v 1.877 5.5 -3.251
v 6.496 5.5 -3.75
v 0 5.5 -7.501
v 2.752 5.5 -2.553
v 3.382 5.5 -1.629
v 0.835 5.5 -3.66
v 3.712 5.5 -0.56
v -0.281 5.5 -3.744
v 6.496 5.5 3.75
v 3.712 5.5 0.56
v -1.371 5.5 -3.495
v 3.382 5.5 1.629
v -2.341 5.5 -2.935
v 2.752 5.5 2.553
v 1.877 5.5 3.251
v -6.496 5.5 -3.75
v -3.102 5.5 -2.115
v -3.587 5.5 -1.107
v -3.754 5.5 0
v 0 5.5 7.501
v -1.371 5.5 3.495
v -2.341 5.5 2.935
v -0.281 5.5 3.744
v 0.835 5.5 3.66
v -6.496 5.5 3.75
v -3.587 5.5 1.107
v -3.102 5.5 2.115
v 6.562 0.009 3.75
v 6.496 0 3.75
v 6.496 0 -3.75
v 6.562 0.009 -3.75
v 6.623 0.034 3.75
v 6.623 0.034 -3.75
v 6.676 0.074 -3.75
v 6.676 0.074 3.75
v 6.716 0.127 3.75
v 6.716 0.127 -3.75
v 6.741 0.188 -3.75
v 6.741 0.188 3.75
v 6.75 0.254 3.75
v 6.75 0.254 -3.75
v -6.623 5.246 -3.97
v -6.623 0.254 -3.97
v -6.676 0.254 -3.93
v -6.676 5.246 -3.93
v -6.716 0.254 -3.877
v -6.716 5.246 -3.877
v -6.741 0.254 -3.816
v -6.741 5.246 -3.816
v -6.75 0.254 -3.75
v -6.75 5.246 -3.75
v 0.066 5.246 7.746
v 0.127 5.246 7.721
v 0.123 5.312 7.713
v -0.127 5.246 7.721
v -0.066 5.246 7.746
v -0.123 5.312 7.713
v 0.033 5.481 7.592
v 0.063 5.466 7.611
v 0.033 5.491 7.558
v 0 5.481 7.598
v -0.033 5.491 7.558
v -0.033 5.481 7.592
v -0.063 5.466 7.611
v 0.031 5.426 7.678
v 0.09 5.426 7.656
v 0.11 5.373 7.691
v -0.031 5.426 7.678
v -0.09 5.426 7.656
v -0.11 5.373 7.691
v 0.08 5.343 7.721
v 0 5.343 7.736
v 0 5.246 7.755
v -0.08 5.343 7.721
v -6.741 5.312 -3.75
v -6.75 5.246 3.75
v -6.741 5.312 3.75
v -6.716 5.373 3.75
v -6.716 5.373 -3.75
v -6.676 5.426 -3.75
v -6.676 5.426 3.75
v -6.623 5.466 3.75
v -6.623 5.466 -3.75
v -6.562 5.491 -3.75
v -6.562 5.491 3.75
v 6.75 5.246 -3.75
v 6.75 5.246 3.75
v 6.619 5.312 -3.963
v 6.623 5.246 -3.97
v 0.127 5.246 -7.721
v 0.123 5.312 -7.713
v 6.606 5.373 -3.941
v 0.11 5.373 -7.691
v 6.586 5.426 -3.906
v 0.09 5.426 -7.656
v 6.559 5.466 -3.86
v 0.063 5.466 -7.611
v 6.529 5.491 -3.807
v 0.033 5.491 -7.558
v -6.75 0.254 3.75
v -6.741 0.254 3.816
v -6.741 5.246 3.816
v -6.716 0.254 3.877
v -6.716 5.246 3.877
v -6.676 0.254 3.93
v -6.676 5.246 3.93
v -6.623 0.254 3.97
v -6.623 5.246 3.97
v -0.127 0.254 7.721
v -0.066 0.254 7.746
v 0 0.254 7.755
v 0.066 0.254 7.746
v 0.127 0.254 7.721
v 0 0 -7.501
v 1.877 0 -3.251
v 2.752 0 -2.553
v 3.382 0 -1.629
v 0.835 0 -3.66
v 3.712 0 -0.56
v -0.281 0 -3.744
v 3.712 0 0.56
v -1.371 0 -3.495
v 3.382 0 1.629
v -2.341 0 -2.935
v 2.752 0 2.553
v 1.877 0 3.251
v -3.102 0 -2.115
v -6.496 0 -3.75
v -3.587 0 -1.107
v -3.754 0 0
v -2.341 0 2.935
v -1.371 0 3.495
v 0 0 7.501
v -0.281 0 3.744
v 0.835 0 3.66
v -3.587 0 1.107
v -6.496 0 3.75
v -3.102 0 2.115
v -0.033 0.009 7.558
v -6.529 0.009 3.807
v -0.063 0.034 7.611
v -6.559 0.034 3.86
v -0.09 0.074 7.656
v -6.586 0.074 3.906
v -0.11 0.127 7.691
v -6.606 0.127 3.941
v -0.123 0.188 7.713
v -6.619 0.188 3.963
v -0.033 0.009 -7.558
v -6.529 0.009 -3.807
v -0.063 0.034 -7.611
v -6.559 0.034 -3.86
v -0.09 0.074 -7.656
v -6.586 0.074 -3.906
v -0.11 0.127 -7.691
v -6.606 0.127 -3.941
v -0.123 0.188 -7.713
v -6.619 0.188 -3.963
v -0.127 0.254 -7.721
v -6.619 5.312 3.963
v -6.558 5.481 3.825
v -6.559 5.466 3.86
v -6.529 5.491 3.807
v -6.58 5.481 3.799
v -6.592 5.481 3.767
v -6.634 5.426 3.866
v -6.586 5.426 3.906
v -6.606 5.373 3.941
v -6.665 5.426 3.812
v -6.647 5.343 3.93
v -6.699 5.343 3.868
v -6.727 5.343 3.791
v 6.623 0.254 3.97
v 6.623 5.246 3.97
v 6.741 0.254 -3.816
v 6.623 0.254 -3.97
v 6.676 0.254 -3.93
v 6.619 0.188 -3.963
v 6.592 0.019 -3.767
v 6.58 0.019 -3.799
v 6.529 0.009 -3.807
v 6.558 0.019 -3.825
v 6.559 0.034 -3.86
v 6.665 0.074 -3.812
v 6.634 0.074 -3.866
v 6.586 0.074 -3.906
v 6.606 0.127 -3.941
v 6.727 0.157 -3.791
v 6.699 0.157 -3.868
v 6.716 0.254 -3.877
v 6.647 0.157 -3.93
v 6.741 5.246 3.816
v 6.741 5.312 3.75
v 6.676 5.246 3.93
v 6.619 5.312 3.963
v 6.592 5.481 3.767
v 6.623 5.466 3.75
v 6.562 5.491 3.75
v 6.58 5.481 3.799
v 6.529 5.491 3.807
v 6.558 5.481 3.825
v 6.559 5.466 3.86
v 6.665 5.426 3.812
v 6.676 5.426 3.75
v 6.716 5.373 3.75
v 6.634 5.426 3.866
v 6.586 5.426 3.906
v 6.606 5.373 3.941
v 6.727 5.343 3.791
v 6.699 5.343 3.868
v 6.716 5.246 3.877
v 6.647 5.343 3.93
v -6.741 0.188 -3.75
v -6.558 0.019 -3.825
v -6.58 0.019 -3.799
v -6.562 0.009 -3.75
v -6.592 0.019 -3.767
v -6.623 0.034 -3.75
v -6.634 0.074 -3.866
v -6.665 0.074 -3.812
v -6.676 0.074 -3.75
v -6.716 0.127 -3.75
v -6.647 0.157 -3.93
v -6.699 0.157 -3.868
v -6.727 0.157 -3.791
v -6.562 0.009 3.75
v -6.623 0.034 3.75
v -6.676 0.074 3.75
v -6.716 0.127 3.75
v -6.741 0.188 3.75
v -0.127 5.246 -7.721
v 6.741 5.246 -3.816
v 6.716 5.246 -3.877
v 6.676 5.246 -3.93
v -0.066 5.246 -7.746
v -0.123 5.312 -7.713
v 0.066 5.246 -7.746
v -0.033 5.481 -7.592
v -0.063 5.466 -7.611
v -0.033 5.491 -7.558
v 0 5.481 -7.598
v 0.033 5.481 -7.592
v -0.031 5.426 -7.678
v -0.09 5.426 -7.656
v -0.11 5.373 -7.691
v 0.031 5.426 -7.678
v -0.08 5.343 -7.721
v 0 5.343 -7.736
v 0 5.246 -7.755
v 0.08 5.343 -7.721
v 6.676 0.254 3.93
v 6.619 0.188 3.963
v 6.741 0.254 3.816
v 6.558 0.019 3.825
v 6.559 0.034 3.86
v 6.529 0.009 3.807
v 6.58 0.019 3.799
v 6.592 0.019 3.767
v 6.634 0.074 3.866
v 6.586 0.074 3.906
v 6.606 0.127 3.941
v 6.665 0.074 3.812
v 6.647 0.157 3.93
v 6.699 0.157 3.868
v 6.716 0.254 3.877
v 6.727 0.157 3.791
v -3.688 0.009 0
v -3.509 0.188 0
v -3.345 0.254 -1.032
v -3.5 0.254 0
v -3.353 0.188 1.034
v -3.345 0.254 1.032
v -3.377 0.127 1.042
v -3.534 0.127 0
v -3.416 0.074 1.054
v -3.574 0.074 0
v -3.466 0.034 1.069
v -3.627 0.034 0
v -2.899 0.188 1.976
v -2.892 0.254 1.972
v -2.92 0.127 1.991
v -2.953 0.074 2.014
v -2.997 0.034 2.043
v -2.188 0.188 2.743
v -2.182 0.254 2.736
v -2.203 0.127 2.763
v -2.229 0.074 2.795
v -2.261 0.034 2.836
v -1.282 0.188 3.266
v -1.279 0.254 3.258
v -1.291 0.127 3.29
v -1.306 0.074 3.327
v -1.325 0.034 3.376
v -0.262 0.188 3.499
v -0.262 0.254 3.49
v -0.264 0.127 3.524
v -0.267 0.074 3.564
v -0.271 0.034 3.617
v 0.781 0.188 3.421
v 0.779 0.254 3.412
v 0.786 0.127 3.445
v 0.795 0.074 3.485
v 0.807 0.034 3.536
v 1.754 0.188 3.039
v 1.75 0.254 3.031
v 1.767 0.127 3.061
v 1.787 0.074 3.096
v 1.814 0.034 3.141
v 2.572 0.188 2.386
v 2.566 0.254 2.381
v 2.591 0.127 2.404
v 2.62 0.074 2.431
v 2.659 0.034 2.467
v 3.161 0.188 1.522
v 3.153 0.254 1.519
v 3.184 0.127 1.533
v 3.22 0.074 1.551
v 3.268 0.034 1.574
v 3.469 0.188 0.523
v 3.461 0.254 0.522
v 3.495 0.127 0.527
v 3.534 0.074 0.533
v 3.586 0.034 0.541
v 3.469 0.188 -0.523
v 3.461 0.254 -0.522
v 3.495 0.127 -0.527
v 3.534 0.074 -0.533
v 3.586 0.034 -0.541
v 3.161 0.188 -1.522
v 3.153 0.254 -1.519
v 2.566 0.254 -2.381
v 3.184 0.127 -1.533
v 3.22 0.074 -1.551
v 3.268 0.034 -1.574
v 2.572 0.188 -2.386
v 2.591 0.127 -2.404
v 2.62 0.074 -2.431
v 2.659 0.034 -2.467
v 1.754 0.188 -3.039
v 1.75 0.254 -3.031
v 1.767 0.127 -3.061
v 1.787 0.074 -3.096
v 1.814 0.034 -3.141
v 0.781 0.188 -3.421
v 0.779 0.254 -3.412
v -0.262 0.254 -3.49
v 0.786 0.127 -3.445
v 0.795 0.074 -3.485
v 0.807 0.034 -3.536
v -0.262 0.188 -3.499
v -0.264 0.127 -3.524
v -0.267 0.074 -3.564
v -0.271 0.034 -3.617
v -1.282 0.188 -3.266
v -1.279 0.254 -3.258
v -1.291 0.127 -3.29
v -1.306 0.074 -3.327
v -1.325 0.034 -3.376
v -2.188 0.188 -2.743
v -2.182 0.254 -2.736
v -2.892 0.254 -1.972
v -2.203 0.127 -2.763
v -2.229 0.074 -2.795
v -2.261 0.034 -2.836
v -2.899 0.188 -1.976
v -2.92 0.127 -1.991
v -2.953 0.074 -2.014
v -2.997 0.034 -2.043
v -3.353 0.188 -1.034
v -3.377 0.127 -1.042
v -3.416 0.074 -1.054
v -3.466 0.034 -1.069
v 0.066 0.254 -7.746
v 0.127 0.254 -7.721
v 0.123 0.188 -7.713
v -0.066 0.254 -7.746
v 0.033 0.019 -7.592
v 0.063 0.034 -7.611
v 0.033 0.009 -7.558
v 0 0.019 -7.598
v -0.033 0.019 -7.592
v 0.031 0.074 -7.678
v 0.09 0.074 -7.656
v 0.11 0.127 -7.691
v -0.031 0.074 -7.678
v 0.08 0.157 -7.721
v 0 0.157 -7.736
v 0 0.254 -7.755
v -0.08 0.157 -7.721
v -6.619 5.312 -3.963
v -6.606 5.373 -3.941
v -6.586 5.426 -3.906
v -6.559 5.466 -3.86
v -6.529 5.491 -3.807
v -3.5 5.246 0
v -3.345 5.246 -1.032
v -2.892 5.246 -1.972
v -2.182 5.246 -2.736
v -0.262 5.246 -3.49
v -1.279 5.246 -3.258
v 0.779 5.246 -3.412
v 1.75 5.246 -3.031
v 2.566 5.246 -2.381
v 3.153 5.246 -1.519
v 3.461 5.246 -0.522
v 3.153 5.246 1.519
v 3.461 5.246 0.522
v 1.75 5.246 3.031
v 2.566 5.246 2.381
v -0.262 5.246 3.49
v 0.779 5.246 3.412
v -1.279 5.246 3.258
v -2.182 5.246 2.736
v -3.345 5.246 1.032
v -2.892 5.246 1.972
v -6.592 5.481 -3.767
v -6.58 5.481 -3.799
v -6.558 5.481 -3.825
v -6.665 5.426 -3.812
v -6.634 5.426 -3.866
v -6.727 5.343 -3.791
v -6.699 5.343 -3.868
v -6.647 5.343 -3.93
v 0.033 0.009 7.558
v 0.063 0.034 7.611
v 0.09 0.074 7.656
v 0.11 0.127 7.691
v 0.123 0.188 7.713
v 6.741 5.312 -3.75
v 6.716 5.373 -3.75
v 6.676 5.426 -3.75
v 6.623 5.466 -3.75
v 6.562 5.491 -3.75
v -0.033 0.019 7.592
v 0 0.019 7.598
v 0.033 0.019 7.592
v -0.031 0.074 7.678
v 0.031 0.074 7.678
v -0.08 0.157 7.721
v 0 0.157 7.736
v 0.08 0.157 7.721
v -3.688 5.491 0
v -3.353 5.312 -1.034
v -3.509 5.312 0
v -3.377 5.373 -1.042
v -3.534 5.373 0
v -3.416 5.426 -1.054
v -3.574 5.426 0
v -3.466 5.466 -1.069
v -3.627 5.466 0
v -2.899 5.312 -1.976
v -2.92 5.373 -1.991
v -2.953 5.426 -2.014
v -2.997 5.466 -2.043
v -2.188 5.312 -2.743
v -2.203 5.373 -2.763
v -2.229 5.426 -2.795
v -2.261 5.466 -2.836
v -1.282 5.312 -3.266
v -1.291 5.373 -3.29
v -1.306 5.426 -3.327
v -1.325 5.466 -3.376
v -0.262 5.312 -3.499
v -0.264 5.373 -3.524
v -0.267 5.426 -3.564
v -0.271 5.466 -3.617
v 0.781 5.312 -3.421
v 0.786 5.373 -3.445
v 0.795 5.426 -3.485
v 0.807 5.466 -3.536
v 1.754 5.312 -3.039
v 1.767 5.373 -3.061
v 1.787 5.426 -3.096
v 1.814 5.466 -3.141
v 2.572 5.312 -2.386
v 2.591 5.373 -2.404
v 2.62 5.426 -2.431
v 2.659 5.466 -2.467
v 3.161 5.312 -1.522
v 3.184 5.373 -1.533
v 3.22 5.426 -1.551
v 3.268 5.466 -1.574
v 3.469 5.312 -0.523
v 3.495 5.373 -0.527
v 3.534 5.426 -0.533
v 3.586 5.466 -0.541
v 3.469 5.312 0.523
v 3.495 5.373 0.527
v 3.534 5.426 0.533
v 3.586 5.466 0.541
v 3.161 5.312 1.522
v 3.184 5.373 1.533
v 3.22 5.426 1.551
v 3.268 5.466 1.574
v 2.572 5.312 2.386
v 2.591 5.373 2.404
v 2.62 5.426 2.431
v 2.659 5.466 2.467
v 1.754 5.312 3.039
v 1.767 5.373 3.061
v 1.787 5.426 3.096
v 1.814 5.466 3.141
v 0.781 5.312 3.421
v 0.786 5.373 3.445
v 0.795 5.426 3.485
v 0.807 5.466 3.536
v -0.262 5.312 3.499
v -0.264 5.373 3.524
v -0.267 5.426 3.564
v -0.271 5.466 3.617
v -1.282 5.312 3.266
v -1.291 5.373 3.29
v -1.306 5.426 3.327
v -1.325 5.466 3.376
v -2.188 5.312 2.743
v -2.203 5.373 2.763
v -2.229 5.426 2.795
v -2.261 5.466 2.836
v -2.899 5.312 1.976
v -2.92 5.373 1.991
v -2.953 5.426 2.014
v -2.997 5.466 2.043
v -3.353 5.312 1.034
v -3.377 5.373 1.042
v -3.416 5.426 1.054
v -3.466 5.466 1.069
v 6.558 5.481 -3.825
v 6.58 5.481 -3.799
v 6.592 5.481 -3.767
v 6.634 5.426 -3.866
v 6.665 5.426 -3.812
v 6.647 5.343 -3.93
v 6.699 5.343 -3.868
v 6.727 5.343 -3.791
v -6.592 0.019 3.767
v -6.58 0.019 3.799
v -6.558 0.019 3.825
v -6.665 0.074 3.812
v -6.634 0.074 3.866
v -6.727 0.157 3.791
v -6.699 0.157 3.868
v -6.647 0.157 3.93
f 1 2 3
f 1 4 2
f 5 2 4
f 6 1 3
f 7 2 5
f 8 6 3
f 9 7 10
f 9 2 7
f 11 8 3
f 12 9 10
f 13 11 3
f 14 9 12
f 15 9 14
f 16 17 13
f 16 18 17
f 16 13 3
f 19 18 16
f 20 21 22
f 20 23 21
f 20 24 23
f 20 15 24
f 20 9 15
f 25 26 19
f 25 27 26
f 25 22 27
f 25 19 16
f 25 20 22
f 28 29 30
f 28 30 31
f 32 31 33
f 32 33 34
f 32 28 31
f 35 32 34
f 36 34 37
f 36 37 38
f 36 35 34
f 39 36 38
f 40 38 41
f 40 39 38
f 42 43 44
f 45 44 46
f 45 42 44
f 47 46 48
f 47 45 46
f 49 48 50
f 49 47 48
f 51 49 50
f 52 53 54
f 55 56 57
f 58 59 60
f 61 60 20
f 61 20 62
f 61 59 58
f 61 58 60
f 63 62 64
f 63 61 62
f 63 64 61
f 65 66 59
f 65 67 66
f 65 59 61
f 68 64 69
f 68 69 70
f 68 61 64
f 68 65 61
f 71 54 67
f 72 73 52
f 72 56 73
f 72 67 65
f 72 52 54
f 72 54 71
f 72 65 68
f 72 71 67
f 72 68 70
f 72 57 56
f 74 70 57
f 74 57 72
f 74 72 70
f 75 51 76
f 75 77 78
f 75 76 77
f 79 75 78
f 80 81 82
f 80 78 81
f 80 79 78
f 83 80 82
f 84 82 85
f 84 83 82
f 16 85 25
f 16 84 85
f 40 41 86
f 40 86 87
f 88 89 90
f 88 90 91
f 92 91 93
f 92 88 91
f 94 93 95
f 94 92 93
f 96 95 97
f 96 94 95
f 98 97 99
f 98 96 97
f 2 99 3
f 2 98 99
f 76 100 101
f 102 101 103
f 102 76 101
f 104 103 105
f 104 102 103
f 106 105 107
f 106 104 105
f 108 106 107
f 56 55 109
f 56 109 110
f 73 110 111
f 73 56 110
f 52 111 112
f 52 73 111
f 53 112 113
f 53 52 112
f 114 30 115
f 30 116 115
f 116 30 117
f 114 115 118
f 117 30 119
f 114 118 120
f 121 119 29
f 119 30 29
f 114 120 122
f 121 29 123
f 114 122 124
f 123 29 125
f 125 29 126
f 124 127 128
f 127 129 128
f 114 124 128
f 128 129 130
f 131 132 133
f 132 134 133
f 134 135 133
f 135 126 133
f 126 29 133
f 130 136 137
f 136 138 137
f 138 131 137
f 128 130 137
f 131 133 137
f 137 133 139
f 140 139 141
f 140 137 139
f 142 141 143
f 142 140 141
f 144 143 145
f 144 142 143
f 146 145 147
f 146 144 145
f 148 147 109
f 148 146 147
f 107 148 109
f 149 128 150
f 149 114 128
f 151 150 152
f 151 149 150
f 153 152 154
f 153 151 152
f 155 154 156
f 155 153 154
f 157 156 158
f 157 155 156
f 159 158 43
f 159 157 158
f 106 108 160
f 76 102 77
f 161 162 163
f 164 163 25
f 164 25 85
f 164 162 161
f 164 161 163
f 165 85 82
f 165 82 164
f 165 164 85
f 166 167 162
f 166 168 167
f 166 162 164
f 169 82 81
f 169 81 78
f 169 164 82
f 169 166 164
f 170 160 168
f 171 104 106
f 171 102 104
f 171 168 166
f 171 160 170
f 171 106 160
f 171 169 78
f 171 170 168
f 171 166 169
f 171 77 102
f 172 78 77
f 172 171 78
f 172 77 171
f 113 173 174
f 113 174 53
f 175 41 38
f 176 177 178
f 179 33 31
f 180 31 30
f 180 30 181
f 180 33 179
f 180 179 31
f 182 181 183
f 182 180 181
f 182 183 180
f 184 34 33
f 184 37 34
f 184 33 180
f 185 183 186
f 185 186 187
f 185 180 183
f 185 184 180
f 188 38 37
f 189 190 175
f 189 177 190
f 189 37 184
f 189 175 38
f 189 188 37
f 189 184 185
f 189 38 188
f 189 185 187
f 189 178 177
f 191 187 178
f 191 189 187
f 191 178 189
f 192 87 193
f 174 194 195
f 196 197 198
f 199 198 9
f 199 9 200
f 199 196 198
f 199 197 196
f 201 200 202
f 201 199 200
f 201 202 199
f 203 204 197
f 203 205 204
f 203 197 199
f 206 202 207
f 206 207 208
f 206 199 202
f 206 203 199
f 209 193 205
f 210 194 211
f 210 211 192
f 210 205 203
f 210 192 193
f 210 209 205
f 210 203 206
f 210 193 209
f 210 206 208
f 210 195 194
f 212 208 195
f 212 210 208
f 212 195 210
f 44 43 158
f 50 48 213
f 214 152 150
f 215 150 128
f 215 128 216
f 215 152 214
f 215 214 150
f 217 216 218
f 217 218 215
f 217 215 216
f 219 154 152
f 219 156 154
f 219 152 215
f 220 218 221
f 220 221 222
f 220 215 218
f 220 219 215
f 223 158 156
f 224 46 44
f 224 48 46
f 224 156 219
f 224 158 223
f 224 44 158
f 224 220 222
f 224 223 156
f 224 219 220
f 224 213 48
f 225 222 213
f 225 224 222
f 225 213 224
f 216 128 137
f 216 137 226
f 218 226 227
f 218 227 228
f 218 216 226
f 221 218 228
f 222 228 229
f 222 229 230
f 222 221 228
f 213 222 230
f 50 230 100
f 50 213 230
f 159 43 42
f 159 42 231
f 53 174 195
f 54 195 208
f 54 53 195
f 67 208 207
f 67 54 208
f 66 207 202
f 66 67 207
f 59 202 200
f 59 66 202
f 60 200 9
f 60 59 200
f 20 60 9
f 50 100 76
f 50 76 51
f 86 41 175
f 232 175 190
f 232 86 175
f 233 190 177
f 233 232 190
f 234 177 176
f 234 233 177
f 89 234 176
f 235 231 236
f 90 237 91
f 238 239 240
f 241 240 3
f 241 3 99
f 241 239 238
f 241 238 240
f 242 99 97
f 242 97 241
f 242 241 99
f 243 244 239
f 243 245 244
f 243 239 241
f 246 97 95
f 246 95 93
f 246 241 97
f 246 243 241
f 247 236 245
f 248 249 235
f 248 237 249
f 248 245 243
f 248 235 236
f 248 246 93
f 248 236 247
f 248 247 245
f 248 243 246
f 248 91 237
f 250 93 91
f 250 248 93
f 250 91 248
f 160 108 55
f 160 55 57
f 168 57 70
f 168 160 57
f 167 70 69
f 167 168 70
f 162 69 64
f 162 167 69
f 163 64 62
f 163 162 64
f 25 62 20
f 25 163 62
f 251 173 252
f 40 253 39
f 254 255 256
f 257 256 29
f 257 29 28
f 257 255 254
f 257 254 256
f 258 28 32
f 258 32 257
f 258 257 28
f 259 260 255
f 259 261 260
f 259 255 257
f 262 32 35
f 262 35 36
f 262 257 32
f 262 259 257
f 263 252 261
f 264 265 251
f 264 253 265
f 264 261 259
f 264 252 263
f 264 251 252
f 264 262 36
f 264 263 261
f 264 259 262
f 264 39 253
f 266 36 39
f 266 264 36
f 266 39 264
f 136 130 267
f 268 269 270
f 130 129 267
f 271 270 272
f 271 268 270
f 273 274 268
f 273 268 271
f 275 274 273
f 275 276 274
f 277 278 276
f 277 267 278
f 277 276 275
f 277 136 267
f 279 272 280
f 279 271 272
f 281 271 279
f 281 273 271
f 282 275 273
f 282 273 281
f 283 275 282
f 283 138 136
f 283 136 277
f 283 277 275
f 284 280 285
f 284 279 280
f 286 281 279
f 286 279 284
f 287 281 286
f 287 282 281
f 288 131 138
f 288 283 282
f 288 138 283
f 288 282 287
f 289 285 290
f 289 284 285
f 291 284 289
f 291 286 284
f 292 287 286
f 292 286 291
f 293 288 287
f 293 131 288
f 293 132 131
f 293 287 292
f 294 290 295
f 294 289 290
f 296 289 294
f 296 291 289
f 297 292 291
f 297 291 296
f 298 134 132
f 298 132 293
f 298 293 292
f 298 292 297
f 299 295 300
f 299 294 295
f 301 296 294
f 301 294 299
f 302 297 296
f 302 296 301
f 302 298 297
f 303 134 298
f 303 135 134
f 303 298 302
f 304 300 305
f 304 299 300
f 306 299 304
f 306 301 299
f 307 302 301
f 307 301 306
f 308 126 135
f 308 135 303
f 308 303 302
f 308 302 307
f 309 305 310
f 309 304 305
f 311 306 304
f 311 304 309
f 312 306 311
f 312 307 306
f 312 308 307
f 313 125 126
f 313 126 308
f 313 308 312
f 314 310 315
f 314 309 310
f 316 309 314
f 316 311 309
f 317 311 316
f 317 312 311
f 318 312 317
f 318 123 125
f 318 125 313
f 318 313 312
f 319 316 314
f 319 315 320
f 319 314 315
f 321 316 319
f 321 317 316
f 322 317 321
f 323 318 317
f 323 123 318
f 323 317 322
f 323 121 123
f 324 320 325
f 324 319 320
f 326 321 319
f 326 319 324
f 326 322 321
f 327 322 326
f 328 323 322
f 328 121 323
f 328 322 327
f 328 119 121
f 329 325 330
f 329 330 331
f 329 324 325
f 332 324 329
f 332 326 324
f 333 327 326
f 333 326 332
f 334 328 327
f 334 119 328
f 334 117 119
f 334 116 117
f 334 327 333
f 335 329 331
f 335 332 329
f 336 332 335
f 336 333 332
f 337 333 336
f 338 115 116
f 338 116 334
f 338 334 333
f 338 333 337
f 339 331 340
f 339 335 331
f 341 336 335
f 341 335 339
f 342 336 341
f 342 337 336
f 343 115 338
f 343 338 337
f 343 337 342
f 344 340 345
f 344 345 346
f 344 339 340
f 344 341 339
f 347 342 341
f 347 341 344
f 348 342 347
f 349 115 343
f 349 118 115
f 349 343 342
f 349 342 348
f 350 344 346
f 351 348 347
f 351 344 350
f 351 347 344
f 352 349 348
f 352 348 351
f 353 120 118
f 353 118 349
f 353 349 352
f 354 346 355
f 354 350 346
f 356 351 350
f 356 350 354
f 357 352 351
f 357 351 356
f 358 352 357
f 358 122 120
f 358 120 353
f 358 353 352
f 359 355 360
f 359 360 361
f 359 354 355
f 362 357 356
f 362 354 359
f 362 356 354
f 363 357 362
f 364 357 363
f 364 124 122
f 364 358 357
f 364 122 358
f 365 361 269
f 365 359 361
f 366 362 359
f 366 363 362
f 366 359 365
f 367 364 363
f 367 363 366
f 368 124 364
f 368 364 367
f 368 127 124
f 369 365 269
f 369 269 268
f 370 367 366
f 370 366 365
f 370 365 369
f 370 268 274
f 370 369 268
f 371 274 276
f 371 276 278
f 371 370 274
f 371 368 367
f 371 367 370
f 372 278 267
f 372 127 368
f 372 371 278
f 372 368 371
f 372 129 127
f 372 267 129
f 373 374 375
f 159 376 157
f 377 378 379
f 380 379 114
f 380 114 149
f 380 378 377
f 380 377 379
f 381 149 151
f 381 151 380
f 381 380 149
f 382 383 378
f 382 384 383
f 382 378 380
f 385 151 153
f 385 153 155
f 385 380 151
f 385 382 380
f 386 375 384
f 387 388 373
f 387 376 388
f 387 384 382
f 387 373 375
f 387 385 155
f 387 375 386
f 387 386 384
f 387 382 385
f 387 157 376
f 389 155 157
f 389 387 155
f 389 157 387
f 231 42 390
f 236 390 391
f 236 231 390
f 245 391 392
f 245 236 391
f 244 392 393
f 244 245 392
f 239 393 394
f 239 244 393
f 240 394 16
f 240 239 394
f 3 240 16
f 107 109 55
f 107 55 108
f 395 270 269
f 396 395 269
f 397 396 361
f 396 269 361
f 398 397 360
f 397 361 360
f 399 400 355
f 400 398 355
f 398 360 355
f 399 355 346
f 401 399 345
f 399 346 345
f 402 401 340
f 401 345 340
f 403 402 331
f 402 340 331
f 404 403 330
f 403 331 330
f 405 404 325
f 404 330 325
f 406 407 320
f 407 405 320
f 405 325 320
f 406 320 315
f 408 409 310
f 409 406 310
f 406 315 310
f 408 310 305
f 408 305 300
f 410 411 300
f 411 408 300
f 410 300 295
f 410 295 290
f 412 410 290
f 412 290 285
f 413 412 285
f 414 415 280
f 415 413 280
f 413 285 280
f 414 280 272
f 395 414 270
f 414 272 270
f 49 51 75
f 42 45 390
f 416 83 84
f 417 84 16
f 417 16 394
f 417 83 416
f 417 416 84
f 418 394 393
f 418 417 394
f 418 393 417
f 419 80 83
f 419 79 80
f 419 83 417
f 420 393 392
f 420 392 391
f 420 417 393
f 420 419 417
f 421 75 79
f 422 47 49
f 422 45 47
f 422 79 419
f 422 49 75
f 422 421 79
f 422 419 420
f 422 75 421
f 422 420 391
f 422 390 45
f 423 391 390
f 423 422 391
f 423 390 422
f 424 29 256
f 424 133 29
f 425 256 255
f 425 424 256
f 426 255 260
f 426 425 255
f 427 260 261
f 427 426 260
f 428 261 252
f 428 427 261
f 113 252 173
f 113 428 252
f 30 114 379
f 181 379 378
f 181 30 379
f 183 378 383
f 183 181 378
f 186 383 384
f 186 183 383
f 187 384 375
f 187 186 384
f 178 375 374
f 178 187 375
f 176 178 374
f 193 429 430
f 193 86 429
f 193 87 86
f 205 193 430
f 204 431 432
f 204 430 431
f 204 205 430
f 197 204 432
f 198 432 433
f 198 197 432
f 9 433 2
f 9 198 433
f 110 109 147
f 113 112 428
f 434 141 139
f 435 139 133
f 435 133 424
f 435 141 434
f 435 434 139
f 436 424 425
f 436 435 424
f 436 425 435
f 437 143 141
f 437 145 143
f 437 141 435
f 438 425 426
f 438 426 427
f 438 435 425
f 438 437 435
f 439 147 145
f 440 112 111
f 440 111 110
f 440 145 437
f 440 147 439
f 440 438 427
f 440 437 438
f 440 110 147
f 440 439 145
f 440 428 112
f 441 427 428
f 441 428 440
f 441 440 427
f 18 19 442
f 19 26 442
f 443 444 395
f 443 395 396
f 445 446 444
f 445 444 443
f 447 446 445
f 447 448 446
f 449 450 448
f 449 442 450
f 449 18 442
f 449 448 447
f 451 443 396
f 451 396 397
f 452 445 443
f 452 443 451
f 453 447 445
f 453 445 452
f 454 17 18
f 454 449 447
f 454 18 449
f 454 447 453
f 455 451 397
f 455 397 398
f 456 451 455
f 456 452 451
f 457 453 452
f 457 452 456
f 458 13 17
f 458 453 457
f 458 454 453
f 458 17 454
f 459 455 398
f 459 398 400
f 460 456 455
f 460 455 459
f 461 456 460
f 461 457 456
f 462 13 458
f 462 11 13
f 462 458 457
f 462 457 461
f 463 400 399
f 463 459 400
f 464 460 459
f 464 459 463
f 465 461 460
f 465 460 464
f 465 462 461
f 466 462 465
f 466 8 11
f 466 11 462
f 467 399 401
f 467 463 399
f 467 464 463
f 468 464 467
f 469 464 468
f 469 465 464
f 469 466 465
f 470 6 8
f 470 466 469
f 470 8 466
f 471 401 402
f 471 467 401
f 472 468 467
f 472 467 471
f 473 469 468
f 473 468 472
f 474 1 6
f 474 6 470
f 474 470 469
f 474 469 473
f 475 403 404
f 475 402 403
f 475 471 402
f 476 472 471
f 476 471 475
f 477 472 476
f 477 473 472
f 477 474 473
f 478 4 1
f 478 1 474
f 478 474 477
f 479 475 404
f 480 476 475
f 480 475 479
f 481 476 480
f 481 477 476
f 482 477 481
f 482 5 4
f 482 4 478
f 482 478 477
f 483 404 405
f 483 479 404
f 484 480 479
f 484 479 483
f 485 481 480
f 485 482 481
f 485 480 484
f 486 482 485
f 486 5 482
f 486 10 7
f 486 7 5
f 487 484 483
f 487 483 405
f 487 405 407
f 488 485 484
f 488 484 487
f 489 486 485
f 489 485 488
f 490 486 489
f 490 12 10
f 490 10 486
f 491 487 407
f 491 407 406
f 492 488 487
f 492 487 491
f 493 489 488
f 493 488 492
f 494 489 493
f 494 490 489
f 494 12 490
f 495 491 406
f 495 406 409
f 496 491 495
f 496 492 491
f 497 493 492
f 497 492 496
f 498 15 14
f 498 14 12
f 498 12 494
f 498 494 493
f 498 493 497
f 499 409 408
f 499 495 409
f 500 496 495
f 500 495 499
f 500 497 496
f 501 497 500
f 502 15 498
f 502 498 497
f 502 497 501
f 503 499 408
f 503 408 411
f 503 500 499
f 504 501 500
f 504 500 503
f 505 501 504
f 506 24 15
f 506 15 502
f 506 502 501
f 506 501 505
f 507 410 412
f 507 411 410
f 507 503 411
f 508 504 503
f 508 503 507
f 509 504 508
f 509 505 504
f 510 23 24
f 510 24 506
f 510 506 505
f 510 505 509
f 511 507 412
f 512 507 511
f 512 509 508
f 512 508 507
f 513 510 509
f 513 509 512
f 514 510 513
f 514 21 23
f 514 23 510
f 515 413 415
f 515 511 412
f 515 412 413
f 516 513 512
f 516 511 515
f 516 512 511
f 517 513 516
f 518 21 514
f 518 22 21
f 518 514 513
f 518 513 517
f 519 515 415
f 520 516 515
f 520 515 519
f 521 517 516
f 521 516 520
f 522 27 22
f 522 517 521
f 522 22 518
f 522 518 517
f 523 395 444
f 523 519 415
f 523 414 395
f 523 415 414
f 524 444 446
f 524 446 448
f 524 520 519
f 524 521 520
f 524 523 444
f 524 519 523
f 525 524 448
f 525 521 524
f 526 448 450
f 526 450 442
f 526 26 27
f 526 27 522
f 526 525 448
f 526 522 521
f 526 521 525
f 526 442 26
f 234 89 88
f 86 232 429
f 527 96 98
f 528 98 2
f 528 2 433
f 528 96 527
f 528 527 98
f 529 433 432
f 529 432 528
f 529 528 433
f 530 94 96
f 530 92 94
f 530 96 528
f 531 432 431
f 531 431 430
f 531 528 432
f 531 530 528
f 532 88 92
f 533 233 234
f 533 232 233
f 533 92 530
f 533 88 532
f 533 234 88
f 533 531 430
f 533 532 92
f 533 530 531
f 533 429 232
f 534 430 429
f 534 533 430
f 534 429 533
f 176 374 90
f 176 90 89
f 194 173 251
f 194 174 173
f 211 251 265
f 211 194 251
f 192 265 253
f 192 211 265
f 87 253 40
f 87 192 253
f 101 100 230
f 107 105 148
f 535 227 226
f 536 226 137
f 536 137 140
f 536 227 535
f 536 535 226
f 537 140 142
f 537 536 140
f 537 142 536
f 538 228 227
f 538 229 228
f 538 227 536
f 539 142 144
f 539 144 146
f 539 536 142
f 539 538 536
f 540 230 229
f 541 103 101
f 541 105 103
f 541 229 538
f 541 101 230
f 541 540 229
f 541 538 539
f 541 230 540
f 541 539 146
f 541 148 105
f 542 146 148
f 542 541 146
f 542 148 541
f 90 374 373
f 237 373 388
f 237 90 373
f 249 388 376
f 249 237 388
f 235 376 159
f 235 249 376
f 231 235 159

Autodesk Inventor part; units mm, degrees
ref_plane "YZ Plane" through (0, 0, 0) normal (1, 0, 0) x (0, 1, 0)
ref_plane "XZ Plane" through (0, 0, 0) normal (0, 1, 0) x (-1, 0, 0)
ref_plane "XY Plane" through (0, 0, 0) normal (0, 0, 1) x (1, 0, 0)
sketch "Sketch1" plane through (0, 0, 0) normal (0, 1, 0) x (-1, 0, 0)
  line L0 (6.75, -3.8971) -> (0, -7.7942)
  line L1 (0, -7.7942) -> (-6.75, -3.8971)
  line L2 (-6.75, -3.8971) -> (-6.75, 3.8971)
  line L3 (-6.75, 3.8971) -> (0, 7.7942)
  line L4 (0, 7.7942) -> (6.75, 3.8971)
  line L5 (6.75, 3.8971) -> (6.75, -3.8971)
  circle A0 centre (0, 0) radius 3.5
  point P0 (-6.75, 0)
  point P1 (6.75, 0)
  dimension "d0" = 13.5
  dimension "d1" = 7
extrude "Extrusion1" add sketch "Sketch1" along normal blind 5.5
fillet "Fillet1" radius 0.254 20 edges at (3.375, 5.5, 5.8457) (-3.375, 5.5, 5.8457) (-6.75, 5.5, 0) (-3.375, 5.5, -5.8457) (3.375, 5.5, -5.8457) (6.75, 5.5, 0) (3.5, 5.5, 0) (3.5, 0, 0) (3.375, 0, 5.8457) (6.75, 0, 0) (3.375, 0, -5.8457) (-3.375, 0, -5.8457) (-6.75, 0, 0) (-3.375, 0, 5.8457) (6.75, 2.75, 3.8971) (6.75, 2.75, -3.8971) (0, 2.75, -7.7942) (-6.75, 2.75, -3.8971) (-6.75, 2.75, 3.8971) (0, 2.75, 7.7942)
properties part number "Threaded Rod Nut" material "Steel, Mild"
